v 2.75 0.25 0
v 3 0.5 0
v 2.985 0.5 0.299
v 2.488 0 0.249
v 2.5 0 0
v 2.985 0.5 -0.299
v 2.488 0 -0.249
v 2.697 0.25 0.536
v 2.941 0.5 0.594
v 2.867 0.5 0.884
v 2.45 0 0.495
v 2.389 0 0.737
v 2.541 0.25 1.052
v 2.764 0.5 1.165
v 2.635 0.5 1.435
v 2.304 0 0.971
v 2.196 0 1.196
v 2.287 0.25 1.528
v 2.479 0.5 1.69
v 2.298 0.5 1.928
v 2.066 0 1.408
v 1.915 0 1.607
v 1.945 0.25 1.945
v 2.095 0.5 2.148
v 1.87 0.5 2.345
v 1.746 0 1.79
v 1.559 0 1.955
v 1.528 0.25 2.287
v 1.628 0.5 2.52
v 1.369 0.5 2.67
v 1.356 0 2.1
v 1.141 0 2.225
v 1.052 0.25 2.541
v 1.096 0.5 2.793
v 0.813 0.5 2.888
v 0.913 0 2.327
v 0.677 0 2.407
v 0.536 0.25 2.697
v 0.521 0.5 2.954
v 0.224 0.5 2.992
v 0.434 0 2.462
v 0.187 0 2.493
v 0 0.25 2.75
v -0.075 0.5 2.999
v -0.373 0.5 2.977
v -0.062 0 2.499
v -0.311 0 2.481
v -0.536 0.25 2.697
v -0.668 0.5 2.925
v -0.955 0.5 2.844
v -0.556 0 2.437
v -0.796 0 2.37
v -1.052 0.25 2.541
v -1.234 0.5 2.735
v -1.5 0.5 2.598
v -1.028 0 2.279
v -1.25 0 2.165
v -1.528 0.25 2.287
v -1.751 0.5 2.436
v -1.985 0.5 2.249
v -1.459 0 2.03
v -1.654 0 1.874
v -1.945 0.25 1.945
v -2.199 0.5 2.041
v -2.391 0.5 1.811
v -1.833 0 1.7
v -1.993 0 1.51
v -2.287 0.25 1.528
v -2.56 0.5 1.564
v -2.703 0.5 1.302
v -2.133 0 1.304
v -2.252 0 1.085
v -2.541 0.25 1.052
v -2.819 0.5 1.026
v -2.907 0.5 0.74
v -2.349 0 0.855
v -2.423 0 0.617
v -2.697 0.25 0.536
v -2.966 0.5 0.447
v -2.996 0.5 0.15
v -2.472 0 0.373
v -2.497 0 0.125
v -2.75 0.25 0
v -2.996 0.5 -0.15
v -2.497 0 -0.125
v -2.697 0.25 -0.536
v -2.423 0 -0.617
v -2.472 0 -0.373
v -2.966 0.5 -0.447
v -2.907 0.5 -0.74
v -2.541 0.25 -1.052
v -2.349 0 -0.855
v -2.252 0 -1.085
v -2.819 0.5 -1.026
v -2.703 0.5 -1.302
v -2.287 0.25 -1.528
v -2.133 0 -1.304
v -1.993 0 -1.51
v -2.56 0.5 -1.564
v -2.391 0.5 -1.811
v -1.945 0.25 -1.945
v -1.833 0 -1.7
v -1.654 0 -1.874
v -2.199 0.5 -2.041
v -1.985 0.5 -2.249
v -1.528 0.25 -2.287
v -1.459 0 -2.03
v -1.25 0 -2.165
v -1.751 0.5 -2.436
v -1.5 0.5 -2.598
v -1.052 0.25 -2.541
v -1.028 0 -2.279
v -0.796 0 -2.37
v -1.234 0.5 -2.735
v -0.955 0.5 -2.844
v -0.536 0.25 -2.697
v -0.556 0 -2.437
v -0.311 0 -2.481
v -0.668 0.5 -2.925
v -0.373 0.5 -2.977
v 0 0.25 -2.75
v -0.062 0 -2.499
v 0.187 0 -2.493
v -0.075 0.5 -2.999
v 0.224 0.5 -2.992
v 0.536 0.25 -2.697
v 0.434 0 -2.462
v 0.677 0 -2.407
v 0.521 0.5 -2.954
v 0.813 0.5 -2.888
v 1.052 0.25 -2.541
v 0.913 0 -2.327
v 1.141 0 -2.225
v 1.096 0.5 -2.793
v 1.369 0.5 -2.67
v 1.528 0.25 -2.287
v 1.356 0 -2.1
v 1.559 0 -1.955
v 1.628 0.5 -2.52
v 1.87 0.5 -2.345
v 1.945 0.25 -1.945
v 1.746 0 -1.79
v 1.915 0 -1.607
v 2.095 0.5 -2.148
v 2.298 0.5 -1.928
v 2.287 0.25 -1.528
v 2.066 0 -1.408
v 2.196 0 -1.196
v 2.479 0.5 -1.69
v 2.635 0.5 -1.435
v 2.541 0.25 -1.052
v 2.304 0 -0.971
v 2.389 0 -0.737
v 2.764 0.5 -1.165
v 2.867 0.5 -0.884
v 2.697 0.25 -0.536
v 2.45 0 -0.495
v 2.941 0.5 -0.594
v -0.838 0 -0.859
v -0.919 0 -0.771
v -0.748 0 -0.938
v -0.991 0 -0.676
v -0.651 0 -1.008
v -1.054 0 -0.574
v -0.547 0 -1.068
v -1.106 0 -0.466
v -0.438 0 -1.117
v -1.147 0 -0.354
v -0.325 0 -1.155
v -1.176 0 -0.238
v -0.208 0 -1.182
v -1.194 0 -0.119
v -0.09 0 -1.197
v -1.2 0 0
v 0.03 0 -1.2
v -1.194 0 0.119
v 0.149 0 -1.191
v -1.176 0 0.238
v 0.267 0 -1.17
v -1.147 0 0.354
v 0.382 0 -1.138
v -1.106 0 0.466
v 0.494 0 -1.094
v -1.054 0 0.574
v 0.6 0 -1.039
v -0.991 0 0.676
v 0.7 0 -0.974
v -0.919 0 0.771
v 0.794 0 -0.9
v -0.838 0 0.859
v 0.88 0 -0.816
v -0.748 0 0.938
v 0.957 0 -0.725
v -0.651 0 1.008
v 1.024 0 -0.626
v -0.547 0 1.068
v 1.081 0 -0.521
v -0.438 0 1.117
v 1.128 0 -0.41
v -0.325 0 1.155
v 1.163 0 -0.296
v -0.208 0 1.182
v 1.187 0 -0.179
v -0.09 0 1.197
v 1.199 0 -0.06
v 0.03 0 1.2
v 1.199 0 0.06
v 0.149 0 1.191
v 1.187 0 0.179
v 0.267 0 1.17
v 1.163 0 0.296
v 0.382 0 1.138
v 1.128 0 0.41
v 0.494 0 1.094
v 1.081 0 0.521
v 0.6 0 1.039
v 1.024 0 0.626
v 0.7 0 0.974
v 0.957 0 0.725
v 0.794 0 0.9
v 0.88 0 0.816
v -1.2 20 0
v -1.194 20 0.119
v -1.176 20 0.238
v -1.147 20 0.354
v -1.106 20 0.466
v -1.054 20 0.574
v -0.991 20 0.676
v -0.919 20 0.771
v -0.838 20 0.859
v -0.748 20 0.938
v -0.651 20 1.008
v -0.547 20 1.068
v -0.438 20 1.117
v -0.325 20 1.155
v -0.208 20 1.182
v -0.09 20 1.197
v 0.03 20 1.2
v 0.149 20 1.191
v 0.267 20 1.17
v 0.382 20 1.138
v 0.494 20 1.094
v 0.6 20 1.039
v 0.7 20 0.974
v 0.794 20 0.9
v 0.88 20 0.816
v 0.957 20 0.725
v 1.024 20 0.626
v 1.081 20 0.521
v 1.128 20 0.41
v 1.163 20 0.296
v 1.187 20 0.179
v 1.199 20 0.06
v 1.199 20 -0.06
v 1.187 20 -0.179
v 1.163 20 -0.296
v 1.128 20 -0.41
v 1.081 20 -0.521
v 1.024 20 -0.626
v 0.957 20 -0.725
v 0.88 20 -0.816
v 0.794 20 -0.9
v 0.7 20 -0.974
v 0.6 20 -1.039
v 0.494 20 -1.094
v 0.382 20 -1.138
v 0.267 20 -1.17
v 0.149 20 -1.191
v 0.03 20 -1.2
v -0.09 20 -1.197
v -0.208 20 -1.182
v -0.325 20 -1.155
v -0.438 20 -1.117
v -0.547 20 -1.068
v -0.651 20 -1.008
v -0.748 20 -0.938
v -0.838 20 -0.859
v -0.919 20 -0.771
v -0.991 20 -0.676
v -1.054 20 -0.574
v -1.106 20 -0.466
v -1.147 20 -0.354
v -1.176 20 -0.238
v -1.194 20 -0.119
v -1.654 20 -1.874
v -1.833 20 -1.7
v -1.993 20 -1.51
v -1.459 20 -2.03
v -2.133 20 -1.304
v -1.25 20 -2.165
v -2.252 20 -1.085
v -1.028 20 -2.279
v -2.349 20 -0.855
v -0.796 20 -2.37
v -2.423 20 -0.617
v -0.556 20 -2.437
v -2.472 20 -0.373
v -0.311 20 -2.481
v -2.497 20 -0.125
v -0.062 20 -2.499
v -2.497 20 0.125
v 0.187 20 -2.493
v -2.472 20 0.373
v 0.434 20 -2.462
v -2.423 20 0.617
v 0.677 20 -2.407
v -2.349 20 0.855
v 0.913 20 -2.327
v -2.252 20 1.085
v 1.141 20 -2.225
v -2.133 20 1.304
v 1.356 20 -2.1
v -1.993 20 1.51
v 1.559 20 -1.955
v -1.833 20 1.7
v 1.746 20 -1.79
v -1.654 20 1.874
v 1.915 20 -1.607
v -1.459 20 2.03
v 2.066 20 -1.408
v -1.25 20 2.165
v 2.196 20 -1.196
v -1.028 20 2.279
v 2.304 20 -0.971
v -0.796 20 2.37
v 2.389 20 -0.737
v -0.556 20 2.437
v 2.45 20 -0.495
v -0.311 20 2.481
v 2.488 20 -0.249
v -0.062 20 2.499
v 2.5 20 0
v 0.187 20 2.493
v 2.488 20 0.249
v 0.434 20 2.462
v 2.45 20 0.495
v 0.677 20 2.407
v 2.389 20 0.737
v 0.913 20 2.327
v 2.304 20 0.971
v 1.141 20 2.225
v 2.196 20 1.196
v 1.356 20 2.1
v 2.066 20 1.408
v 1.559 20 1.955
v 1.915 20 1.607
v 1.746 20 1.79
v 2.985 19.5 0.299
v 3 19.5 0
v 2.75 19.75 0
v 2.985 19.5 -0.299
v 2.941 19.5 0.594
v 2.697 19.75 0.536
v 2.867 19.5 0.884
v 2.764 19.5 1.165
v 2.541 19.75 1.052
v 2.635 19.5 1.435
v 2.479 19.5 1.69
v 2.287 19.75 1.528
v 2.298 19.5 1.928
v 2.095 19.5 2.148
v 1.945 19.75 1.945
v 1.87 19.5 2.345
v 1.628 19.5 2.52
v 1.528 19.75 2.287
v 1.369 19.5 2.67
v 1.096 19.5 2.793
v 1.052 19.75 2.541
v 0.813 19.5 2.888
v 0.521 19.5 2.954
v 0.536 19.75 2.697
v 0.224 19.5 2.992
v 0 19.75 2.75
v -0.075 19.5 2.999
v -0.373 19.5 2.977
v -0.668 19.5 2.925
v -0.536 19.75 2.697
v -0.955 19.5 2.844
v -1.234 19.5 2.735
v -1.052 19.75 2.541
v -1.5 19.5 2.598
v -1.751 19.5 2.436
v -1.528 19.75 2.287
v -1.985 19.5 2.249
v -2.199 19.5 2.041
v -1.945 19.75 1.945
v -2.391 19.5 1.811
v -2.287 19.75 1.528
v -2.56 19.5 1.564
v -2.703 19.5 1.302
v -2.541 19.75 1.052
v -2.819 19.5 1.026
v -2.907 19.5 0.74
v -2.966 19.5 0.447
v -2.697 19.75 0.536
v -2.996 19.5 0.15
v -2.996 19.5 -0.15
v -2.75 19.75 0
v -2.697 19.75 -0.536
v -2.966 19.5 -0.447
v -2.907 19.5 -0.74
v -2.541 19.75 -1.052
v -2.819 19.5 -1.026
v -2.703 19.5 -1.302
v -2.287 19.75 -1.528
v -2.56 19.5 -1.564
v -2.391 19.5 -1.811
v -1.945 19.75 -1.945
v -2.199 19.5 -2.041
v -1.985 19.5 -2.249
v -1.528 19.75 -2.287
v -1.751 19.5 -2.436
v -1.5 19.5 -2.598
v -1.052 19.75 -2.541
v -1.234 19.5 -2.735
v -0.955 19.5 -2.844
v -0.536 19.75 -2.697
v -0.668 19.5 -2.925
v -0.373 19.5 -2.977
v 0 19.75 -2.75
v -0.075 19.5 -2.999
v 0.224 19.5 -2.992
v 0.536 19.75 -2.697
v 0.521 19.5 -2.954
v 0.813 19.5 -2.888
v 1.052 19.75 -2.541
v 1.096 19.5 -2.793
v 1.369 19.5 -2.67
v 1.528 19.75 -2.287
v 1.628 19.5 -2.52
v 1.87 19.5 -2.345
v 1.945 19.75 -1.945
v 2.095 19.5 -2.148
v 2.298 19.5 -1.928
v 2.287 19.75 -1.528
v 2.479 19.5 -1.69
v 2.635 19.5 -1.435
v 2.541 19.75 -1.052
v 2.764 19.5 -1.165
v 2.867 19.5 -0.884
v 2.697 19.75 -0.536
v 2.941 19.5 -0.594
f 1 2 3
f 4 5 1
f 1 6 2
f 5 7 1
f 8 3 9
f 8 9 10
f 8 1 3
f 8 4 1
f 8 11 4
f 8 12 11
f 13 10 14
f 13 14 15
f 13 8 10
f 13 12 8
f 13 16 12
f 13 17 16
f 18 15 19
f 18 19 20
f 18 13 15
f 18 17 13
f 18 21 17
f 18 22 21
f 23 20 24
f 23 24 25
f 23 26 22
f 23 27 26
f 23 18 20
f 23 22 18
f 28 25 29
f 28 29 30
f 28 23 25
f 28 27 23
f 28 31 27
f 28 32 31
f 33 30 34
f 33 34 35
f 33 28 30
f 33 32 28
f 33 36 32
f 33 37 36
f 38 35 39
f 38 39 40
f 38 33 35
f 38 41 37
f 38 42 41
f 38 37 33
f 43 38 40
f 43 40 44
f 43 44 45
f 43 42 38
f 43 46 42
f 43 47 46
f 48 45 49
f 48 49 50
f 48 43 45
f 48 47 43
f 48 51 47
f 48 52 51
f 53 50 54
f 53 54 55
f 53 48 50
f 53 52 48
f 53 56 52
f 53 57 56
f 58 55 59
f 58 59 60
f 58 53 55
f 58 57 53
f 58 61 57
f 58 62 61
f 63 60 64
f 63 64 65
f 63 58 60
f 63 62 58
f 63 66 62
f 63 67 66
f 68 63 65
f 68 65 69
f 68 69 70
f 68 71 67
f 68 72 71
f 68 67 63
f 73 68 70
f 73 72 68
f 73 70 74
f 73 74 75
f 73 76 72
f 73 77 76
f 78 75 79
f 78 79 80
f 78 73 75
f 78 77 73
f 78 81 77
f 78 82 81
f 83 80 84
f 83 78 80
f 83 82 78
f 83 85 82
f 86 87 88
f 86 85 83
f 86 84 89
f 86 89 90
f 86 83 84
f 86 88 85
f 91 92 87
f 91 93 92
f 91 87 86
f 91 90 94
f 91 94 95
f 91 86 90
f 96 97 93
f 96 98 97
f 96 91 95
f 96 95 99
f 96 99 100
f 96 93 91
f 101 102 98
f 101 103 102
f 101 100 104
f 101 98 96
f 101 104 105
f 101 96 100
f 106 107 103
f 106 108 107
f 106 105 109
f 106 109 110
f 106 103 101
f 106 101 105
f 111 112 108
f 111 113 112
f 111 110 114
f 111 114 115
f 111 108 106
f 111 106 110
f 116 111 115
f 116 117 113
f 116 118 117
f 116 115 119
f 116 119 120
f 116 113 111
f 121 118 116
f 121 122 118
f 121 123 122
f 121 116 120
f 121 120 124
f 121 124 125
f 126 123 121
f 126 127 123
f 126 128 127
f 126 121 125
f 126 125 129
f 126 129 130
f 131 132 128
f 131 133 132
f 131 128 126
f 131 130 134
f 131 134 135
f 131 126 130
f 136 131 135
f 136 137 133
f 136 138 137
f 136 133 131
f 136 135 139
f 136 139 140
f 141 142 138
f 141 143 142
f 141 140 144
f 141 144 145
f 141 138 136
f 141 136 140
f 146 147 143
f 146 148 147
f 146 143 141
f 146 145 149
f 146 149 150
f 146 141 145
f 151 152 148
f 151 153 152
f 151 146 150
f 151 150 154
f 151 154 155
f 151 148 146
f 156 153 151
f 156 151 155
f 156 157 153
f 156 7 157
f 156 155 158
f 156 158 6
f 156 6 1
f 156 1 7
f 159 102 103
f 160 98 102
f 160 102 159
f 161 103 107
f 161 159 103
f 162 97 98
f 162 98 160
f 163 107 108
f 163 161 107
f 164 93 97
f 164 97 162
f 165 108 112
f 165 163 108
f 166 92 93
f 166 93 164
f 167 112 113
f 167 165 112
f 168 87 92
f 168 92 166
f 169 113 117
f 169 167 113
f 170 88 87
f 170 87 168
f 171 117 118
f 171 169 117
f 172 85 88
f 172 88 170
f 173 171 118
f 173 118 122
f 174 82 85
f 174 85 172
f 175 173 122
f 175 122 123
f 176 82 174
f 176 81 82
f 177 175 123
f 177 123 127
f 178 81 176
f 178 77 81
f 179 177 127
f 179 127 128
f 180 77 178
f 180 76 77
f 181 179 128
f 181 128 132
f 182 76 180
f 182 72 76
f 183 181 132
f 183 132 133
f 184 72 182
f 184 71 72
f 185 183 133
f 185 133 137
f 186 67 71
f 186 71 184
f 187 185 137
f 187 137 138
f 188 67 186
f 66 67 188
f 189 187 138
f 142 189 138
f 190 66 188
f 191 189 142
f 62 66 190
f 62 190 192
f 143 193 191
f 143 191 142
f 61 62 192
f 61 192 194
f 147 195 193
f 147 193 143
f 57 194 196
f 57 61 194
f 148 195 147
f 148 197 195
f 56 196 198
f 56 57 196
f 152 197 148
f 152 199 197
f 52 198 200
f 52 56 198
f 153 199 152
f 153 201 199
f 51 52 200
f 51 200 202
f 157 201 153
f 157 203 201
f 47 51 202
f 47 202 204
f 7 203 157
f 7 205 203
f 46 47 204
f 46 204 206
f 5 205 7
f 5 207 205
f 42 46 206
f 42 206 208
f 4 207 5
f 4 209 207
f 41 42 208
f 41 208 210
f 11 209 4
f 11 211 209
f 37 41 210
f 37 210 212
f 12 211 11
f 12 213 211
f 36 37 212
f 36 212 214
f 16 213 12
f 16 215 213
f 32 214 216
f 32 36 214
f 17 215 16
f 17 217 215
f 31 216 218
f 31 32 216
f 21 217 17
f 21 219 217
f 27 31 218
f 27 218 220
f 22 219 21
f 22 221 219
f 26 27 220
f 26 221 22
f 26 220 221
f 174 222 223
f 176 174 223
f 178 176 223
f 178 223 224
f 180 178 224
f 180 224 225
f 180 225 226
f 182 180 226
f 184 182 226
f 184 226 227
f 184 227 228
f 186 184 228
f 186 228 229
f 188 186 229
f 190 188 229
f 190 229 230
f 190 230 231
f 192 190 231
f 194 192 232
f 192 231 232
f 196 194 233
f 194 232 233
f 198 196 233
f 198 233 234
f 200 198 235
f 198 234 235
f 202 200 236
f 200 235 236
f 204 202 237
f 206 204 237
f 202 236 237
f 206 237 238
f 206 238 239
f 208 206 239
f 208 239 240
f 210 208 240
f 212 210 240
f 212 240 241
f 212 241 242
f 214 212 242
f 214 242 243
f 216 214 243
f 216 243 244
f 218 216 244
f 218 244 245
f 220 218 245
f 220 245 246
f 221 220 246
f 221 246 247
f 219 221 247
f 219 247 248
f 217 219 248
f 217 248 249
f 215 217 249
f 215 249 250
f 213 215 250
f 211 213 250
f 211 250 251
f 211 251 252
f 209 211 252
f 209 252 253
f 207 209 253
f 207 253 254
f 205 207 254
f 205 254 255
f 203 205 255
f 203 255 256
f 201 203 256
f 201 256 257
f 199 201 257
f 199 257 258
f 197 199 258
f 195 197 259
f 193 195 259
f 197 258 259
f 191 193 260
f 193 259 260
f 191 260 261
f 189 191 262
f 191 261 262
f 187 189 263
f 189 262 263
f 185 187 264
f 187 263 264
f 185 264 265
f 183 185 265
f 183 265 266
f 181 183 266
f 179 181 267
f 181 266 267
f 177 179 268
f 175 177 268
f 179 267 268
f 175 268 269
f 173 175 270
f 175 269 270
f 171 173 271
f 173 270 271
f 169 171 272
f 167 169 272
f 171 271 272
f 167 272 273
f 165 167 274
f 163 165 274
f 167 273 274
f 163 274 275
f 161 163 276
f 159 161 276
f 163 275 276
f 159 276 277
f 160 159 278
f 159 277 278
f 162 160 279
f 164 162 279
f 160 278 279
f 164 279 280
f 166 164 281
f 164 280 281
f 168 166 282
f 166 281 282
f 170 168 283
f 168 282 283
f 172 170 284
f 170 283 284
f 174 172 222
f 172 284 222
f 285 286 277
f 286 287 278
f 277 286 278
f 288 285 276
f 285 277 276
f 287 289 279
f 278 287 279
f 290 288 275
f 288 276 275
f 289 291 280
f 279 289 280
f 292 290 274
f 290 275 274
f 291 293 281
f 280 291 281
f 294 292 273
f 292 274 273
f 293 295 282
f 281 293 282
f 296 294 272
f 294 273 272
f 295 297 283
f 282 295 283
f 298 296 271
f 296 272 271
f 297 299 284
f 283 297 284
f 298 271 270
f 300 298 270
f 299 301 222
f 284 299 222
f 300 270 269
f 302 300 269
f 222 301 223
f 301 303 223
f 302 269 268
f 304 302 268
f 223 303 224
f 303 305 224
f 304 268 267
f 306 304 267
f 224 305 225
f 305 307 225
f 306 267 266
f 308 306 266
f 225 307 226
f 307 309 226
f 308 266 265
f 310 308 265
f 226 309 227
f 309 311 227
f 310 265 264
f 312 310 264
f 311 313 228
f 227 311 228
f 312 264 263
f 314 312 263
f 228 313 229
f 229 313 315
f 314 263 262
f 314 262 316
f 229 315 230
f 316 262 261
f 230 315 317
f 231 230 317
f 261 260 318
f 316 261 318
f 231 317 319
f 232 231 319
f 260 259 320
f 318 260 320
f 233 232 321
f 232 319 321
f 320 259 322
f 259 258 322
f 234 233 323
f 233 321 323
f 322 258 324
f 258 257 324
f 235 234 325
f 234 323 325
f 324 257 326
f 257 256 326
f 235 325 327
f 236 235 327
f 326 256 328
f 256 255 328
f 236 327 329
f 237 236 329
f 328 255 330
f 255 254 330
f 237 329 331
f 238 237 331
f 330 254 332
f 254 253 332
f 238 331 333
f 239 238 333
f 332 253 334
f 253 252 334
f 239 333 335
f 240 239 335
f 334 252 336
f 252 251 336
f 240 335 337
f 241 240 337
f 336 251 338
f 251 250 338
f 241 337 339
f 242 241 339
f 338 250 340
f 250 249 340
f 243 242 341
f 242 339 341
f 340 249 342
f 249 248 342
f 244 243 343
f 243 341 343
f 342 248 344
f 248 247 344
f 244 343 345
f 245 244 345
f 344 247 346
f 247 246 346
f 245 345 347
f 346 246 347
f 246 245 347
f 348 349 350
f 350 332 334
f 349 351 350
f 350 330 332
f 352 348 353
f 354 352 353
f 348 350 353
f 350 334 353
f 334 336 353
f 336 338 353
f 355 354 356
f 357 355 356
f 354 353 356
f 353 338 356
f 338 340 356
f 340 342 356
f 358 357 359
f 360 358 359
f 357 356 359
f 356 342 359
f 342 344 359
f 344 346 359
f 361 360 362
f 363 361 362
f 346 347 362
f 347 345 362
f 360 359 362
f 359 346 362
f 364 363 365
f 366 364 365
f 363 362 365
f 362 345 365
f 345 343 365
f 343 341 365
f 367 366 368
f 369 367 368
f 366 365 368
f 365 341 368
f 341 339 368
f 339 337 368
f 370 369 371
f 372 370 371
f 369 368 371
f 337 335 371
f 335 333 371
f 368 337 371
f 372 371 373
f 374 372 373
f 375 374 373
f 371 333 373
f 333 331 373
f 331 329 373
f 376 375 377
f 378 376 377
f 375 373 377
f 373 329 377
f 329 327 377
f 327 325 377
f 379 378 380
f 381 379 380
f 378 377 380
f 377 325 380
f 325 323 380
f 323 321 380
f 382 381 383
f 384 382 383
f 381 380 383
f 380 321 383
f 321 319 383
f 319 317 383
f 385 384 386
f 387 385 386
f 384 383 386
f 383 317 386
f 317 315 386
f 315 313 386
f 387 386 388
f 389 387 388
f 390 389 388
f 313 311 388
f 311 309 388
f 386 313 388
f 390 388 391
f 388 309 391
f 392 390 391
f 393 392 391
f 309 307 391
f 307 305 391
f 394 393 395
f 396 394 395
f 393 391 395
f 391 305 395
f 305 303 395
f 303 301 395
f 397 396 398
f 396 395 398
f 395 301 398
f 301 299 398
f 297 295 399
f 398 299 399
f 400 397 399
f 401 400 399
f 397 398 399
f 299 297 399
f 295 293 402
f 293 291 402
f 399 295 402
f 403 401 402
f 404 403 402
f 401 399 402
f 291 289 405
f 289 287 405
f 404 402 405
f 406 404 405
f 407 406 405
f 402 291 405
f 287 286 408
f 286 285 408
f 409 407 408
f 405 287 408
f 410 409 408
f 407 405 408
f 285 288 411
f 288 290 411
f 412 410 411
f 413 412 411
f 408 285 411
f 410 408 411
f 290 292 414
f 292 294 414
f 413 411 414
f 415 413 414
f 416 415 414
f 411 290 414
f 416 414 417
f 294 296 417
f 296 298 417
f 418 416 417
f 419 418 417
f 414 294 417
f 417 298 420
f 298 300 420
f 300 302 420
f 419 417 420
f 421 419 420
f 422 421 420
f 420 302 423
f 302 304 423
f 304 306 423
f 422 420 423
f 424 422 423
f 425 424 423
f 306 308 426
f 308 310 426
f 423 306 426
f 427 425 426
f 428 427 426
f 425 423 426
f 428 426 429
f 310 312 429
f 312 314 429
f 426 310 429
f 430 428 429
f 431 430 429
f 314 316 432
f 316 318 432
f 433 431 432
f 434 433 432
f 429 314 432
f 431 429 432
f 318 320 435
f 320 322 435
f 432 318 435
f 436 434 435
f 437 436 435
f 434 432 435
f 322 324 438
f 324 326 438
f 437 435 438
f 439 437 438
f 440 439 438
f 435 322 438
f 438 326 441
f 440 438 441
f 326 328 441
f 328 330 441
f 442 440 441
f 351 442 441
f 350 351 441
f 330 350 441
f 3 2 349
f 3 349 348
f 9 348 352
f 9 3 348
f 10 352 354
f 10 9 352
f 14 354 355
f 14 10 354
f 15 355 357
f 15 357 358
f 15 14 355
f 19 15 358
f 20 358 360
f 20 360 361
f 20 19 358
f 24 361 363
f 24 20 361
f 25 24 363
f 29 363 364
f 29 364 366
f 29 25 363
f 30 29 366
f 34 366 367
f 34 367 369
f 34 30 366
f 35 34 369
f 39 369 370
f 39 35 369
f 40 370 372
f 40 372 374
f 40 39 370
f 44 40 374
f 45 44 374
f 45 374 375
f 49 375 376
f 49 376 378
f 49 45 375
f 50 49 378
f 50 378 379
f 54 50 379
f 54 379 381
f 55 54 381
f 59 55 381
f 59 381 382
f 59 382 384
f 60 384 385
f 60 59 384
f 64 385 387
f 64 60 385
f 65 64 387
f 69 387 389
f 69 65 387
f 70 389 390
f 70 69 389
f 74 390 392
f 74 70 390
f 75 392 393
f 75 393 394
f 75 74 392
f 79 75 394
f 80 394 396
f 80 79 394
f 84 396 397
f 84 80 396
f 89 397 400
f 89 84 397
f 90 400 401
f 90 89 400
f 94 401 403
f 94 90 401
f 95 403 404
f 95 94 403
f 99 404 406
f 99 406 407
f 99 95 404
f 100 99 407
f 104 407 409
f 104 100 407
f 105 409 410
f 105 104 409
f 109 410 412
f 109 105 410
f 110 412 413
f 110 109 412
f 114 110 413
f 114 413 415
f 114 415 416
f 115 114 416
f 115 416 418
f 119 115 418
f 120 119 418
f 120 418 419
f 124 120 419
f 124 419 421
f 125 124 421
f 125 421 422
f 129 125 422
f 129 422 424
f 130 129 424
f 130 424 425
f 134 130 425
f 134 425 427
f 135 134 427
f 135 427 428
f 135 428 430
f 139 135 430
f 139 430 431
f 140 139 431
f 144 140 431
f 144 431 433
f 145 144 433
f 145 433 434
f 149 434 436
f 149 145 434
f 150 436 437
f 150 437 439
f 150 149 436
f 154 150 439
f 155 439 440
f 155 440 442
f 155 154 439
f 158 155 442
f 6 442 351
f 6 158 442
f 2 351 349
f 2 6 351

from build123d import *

# Parameters (mm, degrees)
F0_R     = 3
F1_DEPTH = 20
F2_D     = 2.4
F3_SIZE  = 0.5


with BuildPart() as f1:
    # F0 (on Front) → F1 (new body)
    with BuildSketch(Plane.XZ):
        Circle(F0_R)
    extrude(amount=-F1_DEPTH)

    # F2 (through all)
    with Locations(Plane.XZ):
        with Locations((0, 0)):
            Hole(F2_D / 2)

    # F3
    f3_edges = [f1.edges().sort_by_distance(p)[0] for p in [
        (-3, 0, 0),
        (-3, 20, 0),
    ]]
    chamfer(f3_edges, length=F3_SIZE)


solid = f1.part
